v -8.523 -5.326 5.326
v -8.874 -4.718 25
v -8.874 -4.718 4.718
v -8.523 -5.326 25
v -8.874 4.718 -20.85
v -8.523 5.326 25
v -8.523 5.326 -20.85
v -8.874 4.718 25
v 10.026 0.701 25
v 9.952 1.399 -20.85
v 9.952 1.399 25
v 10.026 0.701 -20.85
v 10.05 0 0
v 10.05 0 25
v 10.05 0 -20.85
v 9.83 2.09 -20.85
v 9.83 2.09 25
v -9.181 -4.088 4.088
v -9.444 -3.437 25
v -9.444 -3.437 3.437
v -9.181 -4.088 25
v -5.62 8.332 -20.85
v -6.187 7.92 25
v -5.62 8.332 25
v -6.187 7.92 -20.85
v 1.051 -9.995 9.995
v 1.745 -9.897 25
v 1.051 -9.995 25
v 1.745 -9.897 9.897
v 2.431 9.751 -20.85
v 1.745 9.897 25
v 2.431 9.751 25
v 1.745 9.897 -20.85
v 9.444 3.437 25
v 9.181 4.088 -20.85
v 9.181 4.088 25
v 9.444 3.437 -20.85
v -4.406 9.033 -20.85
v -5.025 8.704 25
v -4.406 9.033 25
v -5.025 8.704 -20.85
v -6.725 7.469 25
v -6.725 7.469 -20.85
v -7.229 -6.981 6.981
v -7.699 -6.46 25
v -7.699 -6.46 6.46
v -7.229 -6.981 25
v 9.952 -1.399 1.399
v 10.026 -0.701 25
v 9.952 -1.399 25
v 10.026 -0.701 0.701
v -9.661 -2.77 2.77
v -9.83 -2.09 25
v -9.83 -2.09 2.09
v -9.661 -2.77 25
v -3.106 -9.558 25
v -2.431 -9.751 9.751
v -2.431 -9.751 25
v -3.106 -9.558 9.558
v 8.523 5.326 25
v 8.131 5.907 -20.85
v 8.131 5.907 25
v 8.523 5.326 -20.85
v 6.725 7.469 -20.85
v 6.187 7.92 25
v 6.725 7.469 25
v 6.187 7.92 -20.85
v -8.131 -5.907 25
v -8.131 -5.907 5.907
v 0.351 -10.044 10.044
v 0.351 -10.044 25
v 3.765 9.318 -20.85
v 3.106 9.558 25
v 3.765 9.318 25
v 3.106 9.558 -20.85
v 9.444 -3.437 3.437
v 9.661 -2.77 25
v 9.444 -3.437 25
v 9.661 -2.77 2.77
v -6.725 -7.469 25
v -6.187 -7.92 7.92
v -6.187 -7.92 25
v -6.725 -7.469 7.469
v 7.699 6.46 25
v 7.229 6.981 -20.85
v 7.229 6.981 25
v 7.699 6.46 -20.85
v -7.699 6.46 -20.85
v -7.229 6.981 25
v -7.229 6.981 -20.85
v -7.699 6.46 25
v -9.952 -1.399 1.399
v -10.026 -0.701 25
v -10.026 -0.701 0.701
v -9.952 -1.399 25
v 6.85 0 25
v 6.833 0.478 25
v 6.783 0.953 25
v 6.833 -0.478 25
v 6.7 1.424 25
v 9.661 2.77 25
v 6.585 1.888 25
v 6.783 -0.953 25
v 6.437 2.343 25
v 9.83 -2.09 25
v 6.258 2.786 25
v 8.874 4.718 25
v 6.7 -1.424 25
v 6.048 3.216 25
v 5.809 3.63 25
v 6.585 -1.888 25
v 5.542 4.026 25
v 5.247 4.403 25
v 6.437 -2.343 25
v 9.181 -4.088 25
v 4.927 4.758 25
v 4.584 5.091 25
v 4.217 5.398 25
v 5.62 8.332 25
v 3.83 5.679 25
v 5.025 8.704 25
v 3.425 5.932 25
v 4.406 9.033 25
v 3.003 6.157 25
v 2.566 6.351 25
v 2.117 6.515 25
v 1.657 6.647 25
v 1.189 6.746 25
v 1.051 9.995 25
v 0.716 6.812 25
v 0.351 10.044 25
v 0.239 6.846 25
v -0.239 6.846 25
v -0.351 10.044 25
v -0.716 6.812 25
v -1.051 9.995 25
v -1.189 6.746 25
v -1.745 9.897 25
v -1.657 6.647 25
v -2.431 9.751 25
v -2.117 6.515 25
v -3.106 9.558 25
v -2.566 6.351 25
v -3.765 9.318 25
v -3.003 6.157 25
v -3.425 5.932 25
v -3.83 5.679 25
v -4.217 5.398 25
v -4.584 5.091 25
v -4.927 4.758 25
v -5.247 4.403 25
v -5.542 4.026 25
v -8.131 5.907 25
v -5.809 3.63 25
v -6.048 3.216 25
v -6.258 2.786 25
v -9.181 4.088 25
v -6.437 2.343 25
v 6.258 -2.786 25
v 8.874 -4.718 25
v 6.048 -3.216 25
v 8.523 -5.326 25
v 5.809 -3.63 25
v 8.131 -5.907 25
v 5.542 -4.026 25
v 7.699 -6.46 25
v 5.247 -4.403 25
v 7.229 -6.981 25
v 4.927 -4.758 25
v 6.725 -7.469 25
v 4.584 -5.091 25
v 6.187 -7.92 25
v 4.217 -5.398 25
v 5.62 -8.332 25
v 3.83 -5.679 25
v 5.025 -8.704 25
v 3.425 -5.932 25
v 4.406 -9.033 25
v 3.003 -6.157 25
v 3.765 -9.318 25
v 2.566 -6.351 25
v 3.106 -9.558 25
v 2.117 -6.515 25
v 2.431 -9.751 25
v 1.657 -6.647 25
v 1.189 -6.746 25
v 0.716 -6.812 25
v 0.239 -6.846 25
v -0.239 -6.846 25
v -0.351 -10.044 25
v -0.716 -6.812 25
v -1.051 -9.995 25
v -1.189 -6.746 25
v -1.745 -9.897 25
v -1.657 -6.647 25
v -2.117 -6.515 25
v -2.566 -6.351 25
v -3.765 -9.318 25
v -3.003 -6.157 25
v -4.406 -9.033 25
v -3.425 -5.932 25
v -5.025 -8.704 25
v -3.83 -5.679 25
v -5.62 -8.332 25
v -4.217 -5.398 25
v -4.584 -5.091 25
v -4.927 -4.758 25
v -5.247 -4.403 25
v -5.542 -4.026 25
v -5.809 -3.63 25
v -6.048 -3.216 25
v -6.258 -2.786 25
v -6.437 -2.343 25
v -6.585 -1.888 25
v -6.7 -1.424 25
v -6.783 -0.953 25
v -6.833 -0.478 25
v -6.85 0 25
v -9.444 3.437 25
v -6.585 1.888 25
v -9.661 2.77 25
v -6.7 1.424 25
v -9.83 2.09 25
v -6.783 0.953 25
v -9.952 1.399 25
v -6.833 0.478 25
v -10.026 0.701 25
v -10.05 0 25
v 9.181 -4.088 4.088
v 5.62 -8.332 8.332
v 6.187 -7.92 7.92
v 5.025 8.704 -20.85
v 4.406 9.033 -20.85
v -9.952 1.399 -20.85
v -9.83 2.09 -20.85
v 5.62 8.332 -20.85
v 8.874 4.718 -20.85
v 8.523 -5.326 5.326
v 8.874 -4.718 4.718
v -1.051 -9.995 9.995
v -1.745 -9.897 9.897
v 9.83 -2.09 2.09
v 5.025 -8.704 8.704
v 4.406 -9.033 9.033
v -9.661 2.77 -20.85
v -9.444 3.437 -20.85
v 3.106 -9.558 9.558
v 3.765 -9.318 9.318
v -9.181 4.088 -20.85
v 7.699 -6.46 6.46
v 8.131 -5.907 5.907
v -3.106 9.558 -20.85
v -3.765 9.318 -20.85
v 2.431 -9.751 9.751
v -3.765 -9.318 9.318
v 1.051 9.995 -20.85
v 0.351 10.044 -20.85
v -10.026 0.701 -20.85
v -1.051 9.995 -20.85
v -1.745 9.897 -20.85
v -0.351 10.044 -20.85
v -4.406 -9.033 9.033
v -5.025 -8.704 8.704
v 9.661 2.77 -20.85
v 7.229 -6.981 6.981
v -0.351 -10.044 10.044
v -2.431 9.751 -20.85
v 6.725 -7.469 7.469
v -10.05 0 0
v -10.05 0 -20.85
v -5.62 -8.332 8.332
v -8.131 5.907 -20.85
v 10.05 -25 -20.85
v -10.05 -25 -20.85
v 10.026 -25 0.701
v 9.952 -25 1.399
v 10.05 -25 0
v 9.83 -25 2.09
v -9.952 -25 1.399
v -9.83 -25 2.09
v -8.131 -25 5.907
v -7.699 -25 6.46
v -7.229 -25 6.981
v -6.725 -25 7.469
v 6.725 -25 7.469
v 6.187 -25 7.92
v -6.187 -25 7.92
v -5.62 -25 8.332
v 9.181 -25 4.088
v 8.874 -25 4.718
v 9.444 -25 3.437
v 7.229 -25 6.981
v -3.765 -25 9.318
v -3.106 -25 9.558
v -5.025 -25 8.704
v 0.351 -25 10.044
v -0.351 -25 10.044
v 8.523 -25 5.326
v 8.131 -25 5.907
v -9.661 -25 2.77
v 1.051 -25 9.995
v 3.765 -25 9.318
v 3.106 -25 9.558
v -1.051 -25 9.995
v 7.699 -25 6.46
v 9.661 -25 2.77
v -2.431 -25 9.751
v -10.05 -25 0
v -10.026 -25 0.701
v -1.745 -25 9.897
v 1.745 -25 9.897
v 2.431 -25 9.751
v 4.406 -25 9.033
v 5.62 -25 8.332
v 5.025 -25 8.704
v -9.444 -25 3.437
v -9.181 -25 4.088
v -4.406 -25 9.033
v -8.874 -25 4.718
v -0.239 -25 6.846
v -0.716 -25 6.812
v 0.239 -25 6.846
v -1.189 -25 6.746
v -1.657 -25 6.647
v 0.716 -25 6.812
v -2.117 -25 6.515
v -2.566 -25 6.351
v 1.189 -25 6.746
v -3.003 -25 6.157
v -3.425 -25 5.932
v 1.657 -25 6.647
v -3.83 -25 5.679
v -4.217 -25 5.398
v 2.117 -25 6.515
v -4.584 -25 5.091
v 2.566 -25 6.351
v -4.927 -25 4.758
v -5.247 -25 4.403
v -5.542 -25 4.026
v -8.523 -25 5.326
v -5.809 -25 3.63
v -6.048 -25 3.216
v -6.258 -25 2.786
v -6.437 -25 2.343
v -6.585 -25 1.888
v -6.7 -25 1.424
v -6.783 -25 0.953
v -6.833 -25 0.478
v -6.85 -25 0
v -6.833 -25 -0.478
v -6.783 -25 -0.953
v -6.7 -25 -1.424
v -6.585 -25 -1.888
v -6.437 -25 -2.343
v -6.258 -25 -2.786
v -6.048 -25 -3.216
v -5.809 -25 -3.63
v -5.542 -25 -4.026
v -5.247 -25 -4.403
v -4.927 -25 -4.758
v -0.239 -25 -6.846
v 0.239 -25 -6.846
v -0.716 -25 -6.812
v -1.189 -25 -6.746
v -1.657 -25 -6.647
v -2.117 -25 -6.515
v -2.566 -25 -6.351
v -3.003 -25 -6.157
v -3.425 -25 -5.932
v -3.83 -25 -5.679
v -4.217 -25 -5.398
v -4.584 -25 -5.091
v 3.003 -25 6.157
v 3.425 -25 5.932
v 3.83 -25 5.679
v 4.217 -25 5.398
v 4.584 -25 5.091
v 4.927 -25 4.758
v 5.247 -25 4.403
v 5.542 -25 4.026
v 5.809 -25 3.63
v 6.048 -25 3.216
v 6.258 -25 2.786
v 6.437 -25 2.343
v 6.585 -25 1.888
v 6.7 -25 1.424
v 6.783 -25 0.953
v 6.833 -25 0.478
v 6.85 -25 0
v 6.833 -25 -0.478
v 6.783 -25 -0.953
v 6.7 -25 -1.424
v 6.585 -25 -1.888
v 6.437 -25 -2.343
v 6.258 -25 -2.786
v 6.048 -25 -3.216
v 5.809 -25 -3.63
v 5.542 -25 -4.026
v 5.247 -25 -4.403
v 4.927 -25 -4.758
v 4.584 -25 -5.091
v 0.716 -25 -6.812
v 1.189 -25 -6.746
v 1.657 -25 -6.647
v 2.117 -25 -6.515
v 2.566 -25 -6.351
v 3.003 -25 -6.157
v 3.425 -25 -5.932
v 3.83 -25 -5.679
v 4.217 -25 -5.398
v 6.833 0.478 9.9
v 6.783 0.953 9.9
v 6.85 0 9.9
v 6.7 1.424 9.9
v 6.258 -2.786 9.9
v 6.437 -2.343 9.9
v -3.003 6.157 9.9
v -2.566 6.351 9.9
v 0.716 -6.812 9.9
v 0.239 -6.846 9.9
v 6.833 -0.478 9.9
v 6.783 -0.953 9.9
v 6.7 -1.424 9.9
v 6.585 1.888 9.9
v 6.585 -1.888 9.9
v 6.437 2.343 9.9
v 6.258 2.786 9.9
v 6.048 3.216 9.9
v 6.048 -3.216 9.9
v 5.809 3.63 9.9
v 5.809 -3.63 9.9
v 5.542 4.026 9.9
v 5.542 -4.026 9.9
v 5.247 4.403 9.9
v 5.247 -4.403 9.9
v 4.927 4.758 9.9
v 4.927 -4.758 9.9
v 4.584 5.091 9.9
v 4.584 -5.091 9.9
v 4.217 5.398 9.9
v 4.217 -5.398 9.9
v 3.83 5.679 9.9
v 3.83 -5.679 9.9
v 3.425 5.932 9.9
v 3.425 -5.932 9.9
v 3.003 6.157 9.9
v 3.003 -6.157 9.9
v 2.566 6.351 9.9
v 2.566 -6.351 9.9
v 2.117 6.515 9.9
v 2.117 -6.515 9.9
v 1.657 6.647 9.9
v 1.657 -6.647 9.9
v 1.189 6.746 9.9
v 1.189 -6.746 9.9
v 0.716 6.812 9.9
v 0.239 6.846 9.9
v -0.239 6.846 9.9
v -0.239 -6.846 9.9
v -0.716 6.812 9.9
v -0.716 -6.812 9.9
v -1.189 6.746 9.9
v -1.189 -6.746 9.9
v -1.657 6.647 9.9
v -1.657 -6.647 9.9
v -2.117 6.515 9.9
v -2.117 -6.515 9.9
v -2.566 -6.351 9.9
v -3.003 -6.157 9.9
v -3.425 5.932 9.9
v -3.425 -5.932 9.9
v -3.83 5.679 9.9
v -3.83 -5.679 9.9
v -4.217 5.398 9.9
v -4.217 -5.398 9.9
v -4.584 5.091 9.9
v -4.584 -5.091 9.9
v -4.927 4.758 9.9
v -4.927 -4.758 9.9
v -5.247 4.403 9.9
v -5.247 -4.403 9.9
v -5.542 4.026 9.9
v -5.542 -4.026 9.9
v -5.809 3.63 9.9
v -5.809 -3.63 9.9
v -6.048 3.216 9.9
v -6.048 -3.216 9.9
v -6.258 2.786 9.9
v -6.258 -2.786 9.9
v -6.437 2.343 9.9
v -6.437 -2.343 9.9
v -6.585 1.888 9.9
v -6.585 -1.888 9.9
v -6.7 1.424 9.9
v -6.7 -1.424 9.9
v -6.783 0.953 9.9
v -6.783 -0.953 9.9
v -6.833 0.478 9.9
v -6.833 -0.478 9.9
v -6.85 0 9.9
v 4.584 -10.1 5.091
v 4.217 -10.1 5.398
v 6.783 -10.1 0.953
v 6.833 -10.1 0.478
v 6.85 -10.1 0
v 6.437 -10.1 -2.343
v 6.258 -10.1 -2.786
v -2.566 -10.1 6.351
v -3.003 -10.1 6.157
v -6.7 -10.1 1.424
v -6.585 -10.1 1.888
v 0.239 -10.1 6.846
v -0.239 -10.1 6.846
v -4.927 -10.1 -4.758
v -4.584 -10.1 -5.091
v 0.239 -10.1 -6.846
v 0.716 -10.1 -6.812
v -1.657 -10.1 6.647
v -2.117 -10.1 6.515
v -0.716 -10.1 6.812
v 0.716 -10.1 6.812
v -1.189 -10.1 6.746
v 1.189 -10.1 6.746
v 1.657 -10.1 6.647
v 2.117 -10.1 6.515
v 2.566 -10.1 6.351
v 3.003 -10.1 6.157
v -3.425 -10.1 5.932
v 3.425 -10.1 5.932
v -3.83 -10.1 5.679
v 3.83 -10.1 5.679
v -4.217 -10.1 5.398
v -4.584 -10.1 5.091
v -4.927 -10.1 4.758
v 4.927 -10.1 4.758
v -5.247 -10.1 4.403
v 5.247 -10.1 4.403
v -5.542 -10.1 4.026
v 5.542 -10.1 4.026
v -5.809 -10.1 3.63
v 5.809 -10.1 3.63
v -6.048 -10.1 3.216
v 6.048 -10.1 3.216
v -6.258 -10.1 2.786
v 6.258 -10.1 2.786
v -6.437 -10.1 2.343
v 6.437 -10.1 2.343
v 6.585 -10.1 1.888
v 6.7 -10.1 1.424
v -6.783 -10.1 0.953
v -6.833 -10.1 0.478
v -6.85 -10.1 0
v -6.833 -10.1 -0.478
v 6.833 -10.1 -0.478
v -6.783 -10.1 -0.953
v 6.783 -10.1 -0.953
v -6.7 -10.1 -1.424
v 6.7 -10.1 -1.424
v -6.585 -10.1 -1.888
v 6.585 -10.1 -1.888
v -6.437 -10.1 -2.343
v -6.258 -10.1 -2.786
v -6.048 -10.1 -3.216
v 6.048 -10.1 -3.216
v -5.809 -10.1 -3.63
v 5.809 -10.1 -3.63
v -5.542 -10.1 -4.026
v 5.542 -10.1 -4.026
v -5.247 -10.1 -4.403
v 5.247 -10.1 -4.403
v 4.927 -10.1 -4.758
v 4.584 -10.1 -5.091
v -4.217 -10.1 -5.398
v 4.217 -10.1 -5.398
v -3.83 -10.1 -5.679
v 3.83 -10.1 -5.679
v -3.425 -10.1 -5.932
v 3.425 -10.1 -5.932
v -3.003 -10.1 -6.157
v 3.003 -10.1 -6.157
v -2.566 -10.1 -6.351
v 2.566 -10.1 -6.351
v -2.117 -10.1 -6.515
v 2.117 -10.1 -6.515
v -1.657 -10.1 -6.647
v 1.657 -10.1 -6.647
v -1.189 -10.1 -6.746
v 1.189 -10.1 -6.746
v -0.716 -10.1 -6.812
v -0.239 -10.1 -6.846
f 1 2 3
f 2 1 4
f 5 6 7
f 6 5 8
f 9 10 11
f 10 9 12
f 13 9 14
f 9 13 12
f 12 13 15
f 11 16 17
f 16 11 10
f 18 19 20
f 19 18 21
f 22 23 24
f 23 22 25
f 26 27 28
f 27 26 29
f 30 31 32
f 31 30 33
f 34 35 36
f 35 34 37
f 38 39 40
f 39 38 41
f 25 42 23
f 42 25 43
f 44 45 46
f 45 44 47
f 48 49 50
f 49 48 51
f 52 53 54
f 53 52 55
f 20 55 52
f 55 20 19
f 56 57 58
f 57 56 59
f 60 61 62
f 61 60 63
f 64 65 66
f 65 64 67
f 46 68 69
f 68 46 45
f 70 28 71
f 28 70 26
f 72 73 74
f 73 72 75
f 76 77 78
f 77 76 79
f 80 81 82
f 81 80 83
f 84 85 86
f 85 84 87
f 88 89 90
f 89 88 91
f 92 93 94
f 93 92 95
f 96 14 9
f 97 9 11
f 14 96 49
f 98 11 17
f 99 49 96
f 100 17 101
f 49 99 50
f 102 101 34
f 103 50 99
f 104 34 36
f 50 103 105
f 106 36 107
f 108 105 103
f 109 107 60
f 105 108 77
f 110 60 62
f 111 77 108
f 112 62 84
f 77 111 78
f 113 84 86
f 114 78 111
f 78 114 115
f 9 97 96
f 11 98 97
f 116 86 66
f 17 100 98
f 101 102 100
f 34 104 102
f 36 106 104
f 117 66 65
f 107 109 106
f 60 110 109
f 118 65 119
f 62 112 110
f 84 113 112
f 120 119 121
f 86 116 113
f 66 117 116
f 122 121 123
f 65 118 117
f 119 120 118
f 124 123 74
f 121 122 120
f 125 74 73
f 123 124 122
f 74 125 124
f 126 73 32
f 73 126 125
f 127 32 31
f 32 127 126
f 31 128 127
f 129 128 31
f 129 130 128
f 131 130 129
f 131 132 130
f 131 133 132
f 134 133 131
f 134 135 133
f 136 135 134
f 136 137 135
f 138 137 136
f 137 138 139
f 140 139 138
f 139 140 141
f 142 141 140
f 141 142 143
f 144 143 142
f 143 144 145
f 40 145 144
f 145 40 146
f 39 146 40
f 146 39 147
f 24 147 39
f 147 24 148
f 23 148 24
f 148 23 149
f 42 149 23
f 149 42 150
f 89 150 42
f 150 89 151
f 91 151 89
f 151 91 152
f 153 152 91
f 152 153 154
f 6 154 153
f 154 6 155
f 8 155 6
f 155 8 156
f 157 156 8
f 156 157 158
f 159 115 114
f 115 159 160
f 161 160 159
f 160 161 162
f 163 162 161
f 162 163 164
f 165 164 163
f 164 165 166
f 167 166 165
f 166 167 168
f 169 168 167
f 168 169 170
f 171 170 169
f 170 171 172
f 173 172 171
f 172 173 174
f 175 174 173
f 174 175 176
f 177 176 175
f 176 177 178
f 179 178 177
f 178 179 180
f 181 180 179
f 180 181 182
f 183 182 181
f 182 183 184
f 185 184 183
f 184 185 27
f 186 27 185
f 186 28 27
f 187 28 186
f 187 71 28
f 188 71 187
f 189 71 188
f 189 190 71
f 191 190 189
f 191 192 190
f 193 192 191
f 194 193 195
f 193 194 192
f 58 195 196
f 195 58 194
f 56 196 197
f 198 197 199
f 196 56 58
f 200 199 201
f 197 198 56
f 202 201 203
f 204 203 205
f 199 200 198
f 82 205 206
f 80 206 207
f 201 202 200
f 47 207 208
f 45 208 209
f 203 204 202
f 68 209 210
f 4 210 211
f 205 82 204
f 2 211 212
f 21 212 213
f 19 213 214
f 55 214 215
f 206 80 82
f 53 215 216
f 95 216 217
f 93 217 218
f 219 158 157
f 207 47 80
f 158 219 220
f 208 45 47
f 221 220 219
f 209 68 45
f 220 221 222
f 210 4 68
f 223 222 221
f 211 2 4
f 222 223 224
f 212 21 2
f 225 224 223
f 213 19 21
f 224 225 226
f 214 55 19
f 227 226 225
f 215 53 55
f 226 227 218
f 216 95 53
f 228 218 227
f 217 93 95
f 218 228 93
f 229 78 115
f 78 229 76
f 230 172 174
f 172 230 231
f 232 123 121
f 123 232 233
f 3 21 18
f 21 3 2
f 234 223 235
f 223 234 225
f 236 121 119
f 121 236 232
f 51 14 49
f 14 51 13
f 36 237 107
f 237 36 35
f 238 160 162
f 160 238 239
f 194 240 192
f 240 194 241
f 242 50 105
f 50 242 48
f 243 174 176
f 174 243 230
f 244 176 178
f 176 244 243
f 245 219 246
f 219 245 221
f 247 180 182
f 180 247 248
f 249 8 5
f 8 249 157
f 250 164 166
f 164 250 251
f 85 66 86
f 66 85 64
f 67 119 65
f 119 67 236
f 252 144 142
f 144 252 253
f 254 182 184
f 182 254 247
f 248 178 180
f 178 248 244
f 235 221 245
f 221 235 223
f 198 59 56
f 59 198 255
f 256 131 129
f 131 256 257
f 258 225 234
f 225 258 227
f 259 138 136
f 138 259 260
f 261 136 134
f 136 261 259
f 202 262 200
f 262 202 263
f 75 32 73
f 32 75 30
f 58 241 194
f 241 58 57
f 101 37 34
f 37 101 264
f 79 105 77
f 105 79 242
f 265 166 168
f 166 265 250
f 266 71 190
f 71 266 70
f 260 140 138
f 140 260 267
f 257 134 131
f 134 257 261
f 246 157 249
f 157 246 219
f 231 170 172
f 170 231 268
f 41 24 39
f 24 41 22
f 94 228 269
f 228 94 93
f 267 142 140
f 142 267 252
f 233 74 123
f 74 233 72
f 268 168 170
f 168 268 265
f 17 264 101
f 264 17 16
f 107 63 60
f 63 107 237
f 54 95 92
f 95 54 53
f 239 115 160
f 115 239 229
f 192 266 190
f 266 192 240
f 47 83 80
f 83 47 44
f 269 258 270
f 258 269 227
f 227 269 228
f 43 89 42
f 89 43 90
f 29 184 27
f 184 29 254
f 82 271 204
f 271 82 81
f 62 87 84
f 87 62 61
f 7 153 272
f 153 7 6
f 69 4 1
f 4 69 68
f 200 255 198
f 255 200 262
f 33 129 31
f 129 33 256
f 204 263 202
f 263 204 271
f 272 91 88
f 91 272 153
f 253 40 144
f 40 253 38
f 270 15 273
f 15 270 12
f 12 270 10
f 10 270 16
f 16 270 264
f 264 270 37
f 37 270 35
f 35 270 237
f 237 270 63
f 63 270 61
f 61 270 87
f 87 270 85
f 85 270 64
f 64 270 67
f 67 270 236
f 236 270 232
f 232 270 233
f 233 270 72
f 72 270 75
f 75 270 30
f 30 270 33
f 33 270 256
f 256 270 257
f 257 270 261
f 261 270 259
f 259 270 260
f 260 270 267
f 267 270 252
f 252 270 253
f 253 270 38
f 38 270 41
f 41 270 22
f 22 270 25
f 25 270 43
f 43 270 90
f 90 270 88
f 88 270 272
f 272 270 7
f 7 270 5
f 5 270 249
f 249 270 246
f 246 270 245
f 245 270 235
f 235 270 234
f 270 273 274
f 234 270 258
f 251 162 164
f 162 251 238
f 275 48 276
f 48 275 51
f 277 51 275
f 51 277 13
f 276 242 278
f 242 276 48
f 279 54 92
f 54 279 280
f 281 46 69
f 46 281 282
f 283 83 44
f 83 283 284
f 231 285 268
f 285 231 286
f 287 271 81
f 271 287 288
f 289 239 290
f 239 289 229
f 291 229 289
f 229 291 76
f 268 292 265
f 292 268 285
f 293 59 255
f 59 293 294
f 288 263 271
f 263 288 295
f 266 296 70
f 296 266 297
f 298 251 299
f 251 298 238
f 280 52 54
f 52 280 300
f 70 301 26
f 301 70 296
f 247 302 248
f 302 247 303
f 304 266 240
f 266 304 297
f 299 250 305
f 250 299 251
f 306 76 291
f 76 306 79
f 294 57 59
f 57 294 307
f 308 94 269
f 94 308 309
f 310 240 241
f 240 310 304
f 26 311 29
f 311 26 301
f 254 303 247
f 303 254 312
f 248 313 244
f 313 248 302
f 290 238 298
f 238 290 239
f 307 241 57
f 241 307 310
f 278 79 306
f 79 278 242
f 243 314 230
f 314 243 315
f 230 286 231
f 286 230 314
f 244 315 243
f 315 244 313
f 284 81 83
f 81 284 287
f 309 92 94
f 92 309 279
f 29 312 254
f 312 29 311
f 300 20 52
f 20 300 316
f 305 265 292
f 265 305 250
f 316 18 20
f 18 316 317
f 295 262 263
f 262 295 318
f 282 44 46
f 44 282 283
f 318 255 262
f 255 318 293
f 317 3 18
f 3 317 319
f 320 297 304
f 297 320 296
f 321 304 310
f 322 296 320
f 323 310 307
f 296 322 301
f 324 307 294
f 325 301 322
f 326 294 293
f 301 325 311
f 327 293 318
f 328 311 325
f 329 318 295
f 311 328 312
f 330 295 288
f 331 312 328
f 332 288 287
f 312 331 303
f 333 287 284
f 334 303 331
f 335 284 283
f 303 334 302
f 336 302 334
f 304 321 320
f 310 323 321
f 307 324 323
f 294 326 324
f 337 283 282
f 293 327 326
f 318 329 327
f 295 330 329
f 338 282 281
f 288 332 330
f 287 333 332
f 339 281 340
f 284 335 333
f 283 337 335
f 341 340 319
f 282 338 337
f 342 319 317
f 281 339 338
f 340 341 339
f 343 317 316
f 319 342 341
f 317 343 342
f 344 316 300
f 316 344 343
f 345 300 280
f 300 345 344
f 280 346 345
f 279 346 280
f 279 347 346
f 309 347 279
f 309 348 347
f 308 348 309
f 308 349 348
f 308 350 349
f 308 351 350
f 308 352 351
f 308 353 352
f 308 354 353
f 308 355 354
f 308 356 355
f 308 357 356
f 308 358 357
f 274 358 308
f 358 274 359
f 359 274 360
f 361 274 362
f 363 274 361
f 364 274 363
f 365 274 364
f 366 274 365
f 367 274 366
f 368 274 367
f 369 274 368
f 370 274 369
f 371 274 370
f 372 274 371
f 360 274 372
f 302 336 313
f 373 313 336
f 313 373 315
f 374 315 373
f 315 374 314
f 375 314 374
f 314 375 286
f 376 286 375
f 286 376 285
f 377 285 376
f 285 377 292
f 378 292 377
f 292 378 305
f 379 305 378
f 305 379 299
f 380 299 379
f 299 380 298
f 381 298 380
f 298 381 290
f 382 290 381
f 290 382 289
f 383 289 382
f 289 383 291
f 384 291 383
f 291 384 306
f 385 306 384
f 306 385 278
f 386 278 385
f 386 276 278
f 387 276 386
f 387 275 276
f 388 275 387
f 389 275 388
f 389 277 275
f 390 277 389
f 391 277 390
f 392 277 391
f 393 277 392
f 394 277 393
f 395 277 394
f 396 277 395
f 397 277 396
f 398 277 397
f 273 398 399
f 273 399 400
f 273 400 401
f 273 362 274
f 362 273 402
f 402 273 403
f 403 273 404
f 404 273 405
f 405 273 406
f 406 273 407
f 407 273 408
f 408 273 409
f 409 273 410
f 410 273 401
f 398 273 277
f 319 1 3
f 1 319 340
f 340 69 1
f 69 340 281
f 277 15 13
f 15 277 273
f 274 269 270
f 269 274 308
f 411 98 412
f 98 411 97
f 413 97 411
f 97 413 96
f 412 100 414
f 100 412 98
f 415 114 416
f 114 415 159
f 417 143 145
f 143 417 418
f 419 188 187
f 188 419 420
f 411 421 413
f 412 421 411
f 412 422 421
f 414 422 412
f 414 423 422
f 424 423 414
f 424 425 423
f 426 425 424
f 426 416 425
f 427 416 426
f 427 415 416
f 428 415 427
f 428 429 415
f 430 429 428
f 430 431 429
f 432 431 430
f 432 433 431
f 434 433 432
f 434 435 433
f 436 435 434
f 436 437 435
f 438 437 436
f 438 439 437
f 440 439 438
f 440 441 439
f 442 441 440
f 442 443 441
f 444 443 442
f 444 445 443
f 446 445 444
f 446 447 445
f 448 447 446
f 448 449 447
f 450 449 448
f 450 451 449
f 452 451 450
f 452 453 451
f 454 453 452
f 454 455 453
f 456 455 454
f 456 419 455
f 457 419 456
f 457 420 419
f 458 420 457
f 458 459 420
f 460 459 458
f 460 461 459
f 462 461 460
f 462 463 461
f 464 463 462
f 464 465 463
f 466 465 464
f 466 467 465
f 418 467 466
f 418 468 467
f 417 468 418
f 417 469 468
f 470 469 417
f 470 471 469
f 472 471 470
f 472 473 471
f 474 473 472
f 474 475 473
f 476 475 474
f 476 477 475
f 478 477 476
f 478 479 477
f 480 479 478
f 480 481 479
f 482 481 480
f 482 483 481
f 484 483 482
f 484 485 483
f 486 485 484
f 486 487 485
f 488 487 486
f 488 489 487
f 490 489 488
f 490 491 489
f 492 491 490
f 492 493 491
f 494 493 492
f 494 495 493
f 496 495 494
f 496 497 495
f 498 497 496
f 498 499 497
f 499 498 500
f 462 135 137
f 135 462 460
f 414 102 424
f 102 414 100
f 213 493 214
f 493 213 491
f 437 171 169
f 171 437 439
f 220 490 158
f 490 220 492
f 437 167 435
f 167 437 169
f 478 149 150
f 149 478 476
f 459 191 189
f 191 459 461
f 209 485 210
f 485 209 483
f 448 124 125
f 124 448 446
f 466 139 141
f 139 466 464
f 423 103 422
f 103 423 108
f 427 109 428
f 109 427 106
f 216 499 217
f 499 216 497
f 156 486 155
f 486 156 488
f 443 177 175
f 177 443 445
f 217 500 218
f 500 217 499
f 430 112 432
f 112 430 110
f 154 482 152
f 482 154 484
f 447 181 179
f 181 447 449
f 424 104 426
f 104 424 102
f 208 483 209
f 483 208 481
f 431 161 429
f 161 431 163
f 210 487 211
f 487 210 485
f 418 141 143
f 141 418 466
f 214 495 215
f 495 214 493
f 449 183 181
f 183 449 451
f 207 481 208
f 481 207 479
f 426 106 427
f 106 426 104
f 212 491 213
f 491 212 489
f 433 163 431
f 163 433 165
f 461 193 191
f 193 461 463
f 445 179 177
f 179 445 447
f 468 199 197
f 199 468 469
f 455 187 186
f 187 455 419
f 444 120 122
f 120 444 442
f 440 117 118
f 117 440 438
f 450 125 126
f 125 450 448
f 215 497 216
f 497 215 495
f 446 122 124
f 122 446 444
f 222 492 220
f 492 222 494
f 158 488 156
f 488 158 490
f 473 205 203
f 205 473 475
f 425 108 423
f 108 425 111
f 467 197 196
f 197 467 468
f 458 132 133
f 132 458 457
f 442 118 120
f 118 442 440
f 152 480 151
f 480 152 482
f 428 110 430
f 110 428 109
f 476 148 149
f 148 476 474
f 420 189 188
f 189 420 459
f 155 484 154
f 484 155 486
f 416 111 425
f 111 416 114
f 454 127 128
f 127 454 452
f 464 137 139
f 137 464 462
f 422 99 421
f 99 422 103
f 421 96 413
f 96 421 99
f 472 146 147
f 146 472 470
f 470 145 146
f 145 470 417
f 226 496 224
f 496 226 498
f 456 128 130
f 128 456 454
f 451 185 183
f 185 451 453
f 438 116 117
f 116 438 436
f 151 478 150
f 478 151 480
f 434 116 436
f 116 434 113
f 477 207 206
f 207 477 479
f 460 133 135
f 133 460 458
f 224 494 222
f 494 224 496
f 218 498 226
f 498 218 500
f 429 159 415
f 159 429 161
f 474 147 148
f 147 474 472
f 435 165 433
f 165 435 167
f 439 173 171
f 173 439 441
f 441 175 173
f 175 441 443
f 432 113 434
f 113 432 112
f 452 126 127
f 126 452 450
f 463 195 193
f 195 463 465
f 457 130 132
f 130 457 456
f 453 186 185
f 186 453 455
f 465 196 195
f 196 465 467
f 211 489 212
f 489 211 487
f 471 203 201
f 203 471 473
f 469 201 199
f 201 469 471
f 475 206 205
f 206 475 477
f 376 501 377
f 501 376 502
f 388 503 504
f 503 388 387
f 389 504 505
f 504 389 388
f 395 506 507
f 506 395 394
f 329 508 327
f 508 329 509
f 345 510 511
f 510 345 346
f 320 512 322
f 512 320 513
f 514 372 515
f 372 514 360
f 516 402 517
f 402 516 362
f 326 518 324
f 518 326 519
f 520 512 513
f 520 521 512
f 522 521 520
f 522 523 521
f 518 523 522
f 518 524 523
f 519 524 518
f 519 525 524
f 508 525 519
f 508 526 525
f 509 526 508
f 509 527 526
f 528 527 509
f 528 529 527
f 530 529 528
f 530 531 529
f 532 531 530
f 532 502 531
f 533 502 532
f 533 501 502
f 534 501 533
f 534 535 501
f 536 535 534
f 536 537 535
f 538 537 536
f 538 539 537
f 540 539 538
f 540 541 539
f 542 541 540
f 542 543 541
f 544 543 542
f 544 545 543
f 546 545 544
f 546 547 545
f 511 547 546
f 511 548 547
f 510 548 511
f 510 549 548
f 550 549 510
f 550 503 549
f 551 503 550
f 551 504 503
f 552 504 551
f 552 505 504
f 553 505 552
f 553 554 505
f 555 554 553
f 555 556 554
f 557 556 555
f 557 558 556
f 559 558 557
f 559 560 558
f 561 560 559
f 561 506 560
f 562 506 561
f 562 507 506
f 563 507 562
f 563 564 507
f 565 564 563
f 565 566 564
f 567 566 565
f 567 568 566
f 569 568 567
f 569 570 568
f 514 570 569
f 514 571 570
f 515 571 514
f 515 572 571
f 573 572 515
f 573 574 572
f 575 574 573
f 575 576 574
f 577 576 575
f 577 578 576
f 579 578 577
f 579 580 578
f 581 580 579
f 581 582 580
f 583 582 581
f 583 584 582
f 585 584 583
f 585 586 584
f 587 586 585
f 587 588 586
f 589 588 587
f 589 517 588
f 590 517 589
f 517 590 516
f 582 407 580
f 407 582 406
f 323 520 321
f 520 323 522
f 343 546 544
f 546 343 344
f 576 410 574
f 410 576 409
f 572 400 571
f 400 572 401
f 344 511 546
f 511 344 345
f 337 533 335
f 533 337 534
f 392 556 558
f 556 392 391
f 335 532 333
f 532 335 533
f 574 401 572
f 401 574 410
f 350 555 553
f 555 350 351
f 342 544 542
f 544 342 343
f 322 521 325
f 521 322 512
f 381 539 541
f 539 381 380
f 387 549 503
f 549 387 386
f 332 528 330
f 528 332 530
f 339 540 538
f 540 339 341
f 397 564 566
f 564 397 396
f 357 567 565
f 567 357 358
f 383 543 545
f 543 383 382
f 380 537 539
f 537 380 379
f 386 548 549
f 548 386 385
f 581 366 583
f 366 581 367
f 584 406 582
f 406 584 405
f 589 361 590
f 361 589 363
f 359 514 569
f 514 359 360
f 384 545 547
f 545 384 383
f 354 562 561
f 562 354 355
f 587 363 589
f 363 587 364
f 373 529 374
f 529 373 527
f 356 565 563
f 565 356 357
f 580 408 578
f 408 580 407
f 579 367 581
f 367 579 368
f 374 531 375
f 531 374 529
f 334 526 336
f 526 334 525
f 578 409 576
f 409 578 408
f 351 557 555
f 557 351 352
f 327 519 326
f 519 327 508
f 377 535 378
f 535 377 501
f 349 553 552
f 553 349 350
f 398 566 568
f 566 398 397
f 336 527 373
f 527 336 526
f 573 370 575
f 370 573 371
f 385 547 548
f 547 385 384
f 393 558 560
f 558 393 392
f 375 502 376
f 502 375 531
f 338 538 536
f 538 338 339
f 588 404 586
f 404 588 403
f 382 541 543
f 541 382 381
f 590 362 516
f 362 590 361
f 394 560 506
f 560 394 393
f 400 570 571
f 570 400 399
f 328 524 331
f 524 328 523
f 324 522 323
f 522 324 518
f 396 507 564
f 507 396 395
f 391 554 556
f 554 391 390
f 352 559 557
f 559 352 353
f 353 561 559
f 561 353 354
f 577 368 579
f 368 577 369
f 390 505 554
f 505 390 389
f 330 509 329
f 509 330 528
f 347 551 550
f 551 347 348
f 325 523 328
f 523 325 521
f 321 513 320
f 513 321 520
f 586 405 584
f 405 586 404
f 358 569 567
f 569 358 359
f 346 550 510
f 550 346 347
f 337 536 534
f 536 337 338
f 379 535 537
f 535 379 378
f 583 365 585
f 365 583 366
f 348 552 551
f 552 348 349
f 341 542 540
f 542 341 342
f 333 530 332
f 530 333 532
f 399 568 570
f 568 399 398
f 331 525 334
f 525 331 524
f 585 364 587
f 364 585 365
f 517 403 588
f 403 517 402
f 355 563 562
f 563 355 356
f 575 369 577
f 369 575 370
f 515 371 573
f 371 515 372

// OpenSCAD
$fa=4; // default minimum facet angle is now 0.5
$fs=0.05; // default minimum facet size is now 0.05 mm

tolerance = .1;

clampGap = .25;
pipeRad = 6.75 + tolerance;
insertDepth = 15;
totalLen = 25;
groundHeight = 14;
wallThickness = 3.2;

screwHeadExtraGap = .75;
screwRad = 1.5 + 4 * tolerance;
screwHeadRad = 2.25 + screwHeadExtraGap;
nutRad = 3.1 + tolerance;

difference() {
  union() {
    translate([0, 0, -groundHeight - pipeRad]) cylinder(h = totalLen + groundHeight + pipeRad, r = pipeRad + wallThickness);
    rotate([90, 0, 0]) cylinder(h = totalLen, r = pipeRad + wallThickness);
    translate([-pipeRad - wallThickness, -totalLen, -groundHeight - pipeRad]) cube([(pipeRad + wallThickness) * 2, totalLen, groundHeight + pipeRad]);
  }

  union() {
    translate([0, 0, totalLen - insertDepth -.1]) cylinder(h = insertDepth + .2, r = pipeRad);
    translate([0, insertDepth - totalLen -.1, 0]) rotate([90, 0, 0]) cylinder(h = insertDepth + .1, r = pipeRad);
    // translate([clampGap, -50, -50]) cube([20, 100, 100]);
    // rotate([0, 90, 0]) cylinder(h = 50, r = screwRad, center=true);
    // translate([-5, 0, 0]) rotate([0, -90, 0]) linear_extrude(50) cylinder(h = 50, r = screwHeadRad);
  }
}

module hexagon(r = 1) {
  polygon([
    [-1 * r, 0],
    [-.5 * r, r * sqrt(3) / 2],
    [.5 * r, r * sqrt(3) / 2],
    [1 * r, 0],
    [.5 * r, r * sqrt(3) / -2],
    [-.5 * r, r * sqrt(3) / -2],
  ]);
}
